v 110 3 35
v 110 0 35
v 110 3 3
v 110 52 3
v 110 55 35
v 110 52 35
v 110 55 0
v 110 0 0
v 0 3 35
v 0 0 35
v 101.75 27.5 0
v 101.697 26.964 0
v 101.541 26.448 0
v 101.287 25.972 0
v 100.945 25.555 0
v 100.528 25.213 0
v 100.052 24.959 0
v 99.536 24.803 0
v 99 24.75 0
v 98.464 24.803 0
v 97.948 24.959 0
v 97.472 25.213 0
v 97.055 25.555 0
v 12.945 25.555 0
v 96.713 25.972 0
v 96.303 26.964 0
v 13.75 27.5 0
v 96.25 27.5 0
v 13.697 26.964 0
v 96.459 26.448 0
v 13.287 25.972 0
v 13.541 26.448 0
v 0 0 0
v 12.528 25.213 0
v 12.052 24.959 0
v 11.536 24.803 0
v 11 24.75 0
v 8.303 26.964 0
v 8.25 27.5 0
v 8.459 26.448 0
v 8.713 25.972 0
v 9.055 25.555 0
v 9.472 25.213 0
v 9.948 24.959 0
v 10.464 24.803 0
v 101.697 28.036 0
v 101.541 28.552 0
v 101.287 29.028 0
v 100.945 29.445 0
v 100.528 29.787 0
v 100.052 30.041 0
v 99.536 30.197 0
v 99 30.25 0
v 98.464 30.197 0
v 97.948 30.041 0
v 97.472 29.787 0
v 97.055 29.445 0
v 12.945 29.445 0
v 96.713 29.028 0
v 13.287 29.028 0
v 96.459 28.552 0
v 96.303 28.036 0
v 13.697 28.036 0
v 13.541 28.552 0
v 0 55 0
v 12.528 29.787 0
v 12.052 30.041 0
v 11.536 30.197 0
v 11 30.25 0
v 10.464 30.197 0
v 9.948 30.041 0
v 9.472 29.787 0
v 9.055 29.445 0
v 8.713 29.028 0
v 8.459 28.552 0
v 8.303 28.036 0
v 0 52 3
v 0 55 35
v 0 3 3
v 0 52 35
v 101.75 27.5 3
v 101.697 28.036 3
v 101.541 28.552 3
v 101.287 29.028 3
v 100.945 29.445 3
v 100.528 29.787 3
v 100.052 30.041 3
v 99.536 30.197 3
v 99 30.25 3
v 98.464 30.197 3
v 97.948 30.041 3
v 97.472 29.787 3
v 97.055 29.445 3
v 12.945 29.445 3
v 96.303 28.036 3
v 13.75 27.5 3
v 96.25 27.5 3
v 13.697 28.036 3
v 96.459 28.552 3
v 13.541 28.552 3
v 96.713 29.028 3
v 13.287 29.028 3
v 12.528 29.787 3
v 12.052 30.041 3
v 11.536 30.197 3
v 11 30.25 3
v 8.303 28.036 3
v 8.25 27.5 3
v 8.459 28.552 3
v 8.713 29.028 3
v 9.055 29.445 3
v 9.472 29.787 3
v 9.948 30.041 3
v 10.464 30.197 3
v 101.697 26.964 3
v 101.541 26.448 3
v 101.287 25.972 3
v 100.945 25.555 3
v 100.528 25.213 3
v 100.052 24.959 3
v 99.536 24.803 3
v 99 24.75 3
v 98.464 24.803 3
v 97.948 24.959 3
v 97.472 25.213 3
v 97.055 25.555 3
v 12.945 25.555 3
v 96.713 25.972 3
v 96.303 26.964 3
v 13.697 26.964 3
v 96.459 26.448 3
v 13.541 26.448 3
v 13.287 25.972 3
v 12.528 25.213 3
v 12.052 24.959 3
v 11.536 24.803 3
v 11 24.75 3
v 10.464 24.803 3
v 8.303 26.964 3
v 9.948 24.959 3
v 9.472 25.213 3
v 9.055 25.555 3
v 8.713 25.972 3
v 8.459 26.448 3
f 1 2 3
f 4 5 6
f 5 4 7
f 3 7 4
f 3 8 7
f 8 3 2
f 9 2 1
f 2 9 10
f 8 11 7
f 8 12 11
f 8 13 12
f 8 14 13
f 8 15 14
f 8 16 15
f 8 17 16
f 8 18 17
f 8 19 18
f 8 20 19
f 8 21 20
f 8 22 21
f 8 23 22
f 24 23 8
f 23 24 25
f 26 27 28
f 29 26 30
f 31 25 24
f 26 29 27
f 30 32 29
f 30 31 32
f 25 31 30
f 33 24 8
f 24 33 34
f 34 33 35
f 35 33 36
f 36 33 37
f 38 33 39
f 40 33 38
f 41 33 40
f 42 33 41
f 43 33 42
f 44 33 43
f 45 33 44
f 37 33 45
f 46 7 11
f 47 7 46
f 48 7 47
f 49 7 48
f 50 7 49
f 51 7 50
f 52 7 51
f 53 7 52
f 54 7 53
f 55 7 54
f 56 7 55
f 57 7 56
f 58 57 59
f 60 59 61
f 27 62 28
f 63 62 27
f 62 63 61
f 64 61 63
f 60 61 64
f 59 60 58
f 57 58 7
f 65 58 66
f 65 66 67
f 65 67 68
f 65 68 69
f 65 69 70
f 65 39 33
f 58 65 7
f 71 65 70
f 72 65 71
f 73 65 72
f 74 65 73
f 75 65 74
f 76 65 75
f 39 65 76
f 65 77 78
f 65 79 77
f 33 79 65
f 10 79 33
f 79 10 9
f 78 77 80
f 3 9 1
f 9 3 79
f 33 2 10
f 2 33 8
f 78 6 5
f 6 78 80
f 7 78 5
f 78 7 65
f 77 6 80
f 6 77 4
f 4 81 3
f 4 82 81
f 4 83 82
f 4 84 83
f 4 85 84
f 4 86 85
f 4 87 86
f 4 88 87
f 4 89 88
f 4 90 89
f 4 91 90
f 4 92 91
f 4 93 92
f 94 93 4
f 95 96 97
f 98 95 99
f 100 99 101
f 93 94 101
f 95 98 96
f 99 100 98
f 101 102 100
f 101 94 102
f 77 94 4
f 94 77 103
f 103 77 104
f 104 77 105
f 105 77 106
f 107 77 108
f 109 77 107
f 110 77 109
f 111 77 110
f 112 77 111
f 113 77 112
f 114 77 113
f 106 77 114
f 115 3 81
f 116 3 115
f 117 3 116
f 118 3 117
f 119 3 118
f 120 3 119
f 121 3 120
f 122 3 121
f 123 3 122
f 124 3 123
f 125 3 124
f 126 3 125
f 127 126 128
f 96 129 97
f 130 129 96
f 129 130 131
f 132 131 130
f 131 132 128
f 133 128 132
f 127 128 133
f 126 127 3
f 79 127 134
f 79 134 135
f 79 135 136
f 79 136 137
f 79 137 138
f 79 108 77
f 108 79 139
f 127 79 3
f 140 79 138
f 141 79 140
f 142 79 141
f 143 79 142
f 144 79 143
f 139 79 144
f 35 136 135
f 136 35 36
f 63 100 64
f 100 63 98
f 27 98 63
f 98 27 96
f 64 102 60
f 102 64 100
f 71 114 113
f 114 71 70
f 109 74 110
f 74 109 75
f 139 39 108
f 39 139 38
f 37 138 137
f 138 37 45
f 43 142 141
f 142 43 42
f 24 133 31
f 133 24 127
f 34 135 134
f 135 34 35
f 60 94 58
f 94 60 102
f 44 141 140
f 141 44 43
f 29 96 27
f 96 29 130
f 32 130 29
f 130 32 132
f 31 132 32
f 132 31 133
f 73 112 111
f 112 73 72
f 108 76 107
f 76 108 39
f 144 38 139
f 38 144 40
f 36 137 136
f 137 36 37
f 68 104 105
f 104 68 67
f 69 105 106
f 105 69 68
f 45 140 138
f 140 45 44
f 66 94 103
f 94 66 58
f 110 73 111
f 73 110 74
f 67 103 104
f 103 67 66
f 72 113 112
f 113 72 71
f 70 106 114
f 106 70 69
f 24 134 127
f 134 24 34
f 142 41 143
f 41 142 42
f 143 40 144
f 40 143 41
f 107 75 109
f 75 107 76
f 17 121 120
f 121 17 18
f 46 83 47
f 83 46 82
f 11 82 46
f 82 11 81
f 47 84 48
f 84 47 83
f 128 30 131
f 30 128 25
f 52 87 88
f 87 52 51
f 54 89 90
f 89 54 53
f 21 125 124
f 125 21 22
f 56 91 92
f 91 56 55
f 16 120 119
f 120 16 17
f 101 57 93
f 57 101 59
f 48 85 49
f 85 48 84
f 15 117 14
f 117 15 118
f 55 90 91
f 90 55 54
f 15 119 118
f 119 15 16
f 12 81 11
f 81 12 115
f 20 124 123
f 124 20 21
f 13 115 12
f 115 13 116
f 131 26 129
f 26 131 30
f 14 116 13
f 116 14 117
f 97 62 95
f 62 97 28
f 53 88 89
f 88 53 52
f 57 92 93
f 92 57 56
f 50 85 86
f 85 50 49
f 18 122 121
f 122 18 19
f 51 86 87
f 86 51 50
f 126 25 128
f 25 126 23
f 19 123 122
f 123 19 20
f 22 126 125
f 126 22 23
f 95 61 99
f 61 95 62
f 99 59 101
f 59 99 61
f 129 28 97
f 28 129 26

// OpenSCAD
$fn = 32;

// ----------------------------------------------------------------------
// U-bracket: 110 x 55 x 35 mm
// ----------------------------------------------------------------------

// --- parameters (mm) ---
base_len = 110;           // outer length, X
channel_w = 55;           // outer width, Y
upright_h = 35;           // upright height, Z
mat_t = 3;                // wall thickness
hole_d = 5.5;             // clearance for M5

module hole_z(px, py) {
  translate([px, py, -2.5]) cylinder(h = mat_t + 5, d = hole_d);
}
module hole_y_pz(pz) {
  /* through both uprights along Y */
  translate([0, -2.5, pz]) rotate([-90, 0, 0]) cylinder(h = channel_w + 5, d = hole_d);
}

module base() {
  cube([base_len, channel_w, mat_t]);
}

module uprights() {
  cube([base_len, mat_t, upright_h]);
  translate([0, channel_w - mat_t, 0]) cube([base_len, mat_t, upright_h]);
}

difference() {
  union() {
    base();
    uprights();
  }
  hole_z(11, 27.5);
  hole_z(99, 27.5);
}
